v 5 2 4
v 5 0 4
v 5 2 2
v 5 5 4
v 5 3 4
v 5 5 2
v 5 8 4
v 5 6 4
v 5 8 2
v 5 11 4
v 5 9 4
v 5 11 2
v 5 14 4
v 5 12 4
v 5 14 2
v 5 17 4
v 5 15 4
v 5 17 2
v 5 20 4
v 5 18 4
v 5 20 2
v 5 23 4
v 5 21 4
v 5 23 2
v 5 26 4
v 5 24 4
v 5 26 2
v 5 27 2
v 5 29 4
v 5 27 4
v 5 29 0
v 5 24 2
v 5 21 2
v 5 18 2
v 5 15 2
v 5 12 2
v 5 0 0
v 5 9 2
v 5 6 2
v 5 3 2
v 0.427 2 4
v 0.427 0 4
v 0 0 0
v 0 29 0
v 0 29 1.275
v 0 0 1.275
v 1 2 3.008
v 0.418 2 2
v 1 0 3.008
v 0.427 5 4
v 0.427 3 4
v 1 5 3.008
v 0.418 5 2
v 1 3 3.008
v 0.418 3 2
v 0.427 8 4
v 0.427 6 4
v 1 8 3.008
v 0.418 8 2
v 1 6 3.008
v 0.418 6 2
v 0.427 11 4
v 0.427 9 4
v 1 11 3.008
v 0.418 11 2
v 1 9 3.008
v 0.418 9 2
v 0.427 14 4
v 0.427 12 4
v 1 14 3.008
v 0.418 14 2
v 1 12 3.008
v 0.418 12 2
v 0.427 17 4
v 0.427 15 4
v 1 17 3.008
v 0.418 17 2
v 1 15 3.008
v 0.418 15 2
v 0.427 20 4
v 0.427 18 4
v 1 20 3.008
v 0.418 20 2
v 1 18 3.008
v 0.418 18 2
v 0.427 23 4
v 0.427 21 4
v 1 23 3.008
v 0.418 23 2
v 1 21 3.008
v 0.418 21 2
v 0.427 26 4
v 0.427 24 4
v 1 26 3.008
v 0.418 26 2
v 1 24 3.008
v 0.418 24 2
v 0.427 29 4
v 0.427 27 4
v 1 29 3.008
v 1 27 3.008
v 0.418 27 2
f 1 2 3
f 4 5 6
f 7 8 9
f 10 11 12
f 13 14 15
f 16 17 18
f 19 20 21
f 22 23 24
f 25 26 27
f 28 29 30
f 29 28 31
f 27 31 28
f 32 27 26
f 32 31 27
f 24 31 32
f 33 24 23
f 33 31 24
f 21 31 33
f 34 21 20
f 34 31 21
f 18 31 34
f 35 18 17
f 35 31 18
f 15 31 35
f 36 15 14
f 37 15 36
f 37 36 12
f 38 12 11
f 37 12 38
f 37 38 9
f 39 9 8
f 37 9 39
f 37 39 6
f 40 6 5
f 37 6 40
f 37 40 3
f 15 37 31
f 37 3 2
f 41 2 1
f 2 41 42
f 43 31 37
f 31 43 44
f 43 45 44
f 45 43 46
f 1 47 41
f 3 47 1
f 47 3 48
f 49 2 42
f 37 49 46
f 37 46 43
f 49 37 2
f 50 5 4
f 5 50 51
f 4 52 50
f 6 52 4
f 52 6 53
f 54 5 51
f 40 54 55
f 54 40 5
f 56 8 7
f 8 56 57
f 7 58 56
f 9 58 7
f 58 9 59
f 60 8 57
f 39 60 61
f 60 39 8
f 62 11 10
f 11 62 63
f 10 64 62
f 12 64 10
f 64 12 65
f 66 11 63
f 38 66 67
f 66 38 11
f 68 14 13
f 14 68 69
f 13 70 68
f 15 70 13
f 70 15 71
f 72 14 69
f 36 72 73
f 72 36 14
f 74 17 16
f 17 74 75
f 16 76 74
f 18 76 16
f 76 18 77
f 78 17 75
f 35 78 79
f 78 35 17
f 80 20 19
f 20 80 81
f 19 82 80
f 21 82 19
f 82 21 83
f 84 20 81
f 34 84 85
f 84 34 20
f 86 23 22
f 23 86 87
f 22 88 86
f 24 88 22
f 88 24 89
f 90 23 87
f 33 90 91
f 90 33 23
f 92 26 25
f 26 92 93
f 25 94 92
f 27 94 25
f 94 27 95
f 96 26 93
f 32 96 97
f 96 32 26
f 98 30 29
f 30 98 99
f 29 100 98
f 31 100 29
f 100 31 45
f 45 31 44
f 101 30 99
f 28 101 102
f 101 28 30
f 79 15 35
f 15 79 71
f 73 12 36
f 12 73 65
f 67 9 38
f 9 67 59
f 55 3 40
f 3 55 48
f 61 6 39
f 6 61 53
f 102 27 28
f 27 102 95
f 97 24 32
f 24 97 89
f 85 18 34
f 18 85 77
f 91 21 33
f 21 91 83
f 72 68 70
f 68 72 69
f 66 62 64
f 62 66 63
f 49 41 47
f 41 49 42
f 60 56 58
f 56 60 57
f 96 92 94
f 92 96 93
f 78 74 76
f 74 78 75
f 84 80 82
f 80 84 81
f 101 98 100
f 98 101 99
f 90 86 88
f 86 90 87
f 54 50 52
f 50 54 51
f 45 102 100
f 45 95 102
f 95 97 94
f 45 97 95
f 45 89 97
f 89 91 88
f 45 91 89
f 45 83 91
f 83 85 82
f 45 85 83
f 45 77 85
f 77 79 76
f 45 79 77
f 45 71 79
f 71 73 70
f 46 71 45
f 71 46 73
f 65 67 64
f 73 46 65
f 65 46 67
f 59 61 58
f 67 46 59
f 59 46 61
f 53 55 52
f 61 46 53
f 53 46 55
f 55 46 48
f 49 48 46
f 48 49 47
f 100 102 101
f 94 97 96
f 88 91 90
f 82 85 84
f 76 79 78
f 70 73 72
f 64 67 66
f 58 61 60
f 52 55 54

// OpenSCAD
TOOTH_WIDTH = 2;
TOOTH_DEPTH = 4;
BAR_DEPTH = 1;
TOOTH_SPACING = 1;
TEETH = 10 ;
H = 4;
L = TOOTH_WIDTH * TEETH + TOOTH_SPACING * TEETH - 1;

difference() {
  union() {
    for (i = [0 : 1 : TEETH - 1]) {
      translate([
        0, 
        i * TOOTH_WIDTH + i * TOOTH_SPACING,  
        0
      ])
        cube([
          TOOTH_DEPTH + BAR_DEPTH, 
          TOOTH_WIDTH, 
          H
        ]);
    }

    cube([
      BAR_DEPTH + TOOTH_DEPTH,
      L,
      H / 2
    ]);
  }

  translate([-H / 2 * sin(30), -0.5, H / 1.33])
    rotate([90, 0, 180])
      cylinder(L + 1, d = H, $fn = 6);
}
